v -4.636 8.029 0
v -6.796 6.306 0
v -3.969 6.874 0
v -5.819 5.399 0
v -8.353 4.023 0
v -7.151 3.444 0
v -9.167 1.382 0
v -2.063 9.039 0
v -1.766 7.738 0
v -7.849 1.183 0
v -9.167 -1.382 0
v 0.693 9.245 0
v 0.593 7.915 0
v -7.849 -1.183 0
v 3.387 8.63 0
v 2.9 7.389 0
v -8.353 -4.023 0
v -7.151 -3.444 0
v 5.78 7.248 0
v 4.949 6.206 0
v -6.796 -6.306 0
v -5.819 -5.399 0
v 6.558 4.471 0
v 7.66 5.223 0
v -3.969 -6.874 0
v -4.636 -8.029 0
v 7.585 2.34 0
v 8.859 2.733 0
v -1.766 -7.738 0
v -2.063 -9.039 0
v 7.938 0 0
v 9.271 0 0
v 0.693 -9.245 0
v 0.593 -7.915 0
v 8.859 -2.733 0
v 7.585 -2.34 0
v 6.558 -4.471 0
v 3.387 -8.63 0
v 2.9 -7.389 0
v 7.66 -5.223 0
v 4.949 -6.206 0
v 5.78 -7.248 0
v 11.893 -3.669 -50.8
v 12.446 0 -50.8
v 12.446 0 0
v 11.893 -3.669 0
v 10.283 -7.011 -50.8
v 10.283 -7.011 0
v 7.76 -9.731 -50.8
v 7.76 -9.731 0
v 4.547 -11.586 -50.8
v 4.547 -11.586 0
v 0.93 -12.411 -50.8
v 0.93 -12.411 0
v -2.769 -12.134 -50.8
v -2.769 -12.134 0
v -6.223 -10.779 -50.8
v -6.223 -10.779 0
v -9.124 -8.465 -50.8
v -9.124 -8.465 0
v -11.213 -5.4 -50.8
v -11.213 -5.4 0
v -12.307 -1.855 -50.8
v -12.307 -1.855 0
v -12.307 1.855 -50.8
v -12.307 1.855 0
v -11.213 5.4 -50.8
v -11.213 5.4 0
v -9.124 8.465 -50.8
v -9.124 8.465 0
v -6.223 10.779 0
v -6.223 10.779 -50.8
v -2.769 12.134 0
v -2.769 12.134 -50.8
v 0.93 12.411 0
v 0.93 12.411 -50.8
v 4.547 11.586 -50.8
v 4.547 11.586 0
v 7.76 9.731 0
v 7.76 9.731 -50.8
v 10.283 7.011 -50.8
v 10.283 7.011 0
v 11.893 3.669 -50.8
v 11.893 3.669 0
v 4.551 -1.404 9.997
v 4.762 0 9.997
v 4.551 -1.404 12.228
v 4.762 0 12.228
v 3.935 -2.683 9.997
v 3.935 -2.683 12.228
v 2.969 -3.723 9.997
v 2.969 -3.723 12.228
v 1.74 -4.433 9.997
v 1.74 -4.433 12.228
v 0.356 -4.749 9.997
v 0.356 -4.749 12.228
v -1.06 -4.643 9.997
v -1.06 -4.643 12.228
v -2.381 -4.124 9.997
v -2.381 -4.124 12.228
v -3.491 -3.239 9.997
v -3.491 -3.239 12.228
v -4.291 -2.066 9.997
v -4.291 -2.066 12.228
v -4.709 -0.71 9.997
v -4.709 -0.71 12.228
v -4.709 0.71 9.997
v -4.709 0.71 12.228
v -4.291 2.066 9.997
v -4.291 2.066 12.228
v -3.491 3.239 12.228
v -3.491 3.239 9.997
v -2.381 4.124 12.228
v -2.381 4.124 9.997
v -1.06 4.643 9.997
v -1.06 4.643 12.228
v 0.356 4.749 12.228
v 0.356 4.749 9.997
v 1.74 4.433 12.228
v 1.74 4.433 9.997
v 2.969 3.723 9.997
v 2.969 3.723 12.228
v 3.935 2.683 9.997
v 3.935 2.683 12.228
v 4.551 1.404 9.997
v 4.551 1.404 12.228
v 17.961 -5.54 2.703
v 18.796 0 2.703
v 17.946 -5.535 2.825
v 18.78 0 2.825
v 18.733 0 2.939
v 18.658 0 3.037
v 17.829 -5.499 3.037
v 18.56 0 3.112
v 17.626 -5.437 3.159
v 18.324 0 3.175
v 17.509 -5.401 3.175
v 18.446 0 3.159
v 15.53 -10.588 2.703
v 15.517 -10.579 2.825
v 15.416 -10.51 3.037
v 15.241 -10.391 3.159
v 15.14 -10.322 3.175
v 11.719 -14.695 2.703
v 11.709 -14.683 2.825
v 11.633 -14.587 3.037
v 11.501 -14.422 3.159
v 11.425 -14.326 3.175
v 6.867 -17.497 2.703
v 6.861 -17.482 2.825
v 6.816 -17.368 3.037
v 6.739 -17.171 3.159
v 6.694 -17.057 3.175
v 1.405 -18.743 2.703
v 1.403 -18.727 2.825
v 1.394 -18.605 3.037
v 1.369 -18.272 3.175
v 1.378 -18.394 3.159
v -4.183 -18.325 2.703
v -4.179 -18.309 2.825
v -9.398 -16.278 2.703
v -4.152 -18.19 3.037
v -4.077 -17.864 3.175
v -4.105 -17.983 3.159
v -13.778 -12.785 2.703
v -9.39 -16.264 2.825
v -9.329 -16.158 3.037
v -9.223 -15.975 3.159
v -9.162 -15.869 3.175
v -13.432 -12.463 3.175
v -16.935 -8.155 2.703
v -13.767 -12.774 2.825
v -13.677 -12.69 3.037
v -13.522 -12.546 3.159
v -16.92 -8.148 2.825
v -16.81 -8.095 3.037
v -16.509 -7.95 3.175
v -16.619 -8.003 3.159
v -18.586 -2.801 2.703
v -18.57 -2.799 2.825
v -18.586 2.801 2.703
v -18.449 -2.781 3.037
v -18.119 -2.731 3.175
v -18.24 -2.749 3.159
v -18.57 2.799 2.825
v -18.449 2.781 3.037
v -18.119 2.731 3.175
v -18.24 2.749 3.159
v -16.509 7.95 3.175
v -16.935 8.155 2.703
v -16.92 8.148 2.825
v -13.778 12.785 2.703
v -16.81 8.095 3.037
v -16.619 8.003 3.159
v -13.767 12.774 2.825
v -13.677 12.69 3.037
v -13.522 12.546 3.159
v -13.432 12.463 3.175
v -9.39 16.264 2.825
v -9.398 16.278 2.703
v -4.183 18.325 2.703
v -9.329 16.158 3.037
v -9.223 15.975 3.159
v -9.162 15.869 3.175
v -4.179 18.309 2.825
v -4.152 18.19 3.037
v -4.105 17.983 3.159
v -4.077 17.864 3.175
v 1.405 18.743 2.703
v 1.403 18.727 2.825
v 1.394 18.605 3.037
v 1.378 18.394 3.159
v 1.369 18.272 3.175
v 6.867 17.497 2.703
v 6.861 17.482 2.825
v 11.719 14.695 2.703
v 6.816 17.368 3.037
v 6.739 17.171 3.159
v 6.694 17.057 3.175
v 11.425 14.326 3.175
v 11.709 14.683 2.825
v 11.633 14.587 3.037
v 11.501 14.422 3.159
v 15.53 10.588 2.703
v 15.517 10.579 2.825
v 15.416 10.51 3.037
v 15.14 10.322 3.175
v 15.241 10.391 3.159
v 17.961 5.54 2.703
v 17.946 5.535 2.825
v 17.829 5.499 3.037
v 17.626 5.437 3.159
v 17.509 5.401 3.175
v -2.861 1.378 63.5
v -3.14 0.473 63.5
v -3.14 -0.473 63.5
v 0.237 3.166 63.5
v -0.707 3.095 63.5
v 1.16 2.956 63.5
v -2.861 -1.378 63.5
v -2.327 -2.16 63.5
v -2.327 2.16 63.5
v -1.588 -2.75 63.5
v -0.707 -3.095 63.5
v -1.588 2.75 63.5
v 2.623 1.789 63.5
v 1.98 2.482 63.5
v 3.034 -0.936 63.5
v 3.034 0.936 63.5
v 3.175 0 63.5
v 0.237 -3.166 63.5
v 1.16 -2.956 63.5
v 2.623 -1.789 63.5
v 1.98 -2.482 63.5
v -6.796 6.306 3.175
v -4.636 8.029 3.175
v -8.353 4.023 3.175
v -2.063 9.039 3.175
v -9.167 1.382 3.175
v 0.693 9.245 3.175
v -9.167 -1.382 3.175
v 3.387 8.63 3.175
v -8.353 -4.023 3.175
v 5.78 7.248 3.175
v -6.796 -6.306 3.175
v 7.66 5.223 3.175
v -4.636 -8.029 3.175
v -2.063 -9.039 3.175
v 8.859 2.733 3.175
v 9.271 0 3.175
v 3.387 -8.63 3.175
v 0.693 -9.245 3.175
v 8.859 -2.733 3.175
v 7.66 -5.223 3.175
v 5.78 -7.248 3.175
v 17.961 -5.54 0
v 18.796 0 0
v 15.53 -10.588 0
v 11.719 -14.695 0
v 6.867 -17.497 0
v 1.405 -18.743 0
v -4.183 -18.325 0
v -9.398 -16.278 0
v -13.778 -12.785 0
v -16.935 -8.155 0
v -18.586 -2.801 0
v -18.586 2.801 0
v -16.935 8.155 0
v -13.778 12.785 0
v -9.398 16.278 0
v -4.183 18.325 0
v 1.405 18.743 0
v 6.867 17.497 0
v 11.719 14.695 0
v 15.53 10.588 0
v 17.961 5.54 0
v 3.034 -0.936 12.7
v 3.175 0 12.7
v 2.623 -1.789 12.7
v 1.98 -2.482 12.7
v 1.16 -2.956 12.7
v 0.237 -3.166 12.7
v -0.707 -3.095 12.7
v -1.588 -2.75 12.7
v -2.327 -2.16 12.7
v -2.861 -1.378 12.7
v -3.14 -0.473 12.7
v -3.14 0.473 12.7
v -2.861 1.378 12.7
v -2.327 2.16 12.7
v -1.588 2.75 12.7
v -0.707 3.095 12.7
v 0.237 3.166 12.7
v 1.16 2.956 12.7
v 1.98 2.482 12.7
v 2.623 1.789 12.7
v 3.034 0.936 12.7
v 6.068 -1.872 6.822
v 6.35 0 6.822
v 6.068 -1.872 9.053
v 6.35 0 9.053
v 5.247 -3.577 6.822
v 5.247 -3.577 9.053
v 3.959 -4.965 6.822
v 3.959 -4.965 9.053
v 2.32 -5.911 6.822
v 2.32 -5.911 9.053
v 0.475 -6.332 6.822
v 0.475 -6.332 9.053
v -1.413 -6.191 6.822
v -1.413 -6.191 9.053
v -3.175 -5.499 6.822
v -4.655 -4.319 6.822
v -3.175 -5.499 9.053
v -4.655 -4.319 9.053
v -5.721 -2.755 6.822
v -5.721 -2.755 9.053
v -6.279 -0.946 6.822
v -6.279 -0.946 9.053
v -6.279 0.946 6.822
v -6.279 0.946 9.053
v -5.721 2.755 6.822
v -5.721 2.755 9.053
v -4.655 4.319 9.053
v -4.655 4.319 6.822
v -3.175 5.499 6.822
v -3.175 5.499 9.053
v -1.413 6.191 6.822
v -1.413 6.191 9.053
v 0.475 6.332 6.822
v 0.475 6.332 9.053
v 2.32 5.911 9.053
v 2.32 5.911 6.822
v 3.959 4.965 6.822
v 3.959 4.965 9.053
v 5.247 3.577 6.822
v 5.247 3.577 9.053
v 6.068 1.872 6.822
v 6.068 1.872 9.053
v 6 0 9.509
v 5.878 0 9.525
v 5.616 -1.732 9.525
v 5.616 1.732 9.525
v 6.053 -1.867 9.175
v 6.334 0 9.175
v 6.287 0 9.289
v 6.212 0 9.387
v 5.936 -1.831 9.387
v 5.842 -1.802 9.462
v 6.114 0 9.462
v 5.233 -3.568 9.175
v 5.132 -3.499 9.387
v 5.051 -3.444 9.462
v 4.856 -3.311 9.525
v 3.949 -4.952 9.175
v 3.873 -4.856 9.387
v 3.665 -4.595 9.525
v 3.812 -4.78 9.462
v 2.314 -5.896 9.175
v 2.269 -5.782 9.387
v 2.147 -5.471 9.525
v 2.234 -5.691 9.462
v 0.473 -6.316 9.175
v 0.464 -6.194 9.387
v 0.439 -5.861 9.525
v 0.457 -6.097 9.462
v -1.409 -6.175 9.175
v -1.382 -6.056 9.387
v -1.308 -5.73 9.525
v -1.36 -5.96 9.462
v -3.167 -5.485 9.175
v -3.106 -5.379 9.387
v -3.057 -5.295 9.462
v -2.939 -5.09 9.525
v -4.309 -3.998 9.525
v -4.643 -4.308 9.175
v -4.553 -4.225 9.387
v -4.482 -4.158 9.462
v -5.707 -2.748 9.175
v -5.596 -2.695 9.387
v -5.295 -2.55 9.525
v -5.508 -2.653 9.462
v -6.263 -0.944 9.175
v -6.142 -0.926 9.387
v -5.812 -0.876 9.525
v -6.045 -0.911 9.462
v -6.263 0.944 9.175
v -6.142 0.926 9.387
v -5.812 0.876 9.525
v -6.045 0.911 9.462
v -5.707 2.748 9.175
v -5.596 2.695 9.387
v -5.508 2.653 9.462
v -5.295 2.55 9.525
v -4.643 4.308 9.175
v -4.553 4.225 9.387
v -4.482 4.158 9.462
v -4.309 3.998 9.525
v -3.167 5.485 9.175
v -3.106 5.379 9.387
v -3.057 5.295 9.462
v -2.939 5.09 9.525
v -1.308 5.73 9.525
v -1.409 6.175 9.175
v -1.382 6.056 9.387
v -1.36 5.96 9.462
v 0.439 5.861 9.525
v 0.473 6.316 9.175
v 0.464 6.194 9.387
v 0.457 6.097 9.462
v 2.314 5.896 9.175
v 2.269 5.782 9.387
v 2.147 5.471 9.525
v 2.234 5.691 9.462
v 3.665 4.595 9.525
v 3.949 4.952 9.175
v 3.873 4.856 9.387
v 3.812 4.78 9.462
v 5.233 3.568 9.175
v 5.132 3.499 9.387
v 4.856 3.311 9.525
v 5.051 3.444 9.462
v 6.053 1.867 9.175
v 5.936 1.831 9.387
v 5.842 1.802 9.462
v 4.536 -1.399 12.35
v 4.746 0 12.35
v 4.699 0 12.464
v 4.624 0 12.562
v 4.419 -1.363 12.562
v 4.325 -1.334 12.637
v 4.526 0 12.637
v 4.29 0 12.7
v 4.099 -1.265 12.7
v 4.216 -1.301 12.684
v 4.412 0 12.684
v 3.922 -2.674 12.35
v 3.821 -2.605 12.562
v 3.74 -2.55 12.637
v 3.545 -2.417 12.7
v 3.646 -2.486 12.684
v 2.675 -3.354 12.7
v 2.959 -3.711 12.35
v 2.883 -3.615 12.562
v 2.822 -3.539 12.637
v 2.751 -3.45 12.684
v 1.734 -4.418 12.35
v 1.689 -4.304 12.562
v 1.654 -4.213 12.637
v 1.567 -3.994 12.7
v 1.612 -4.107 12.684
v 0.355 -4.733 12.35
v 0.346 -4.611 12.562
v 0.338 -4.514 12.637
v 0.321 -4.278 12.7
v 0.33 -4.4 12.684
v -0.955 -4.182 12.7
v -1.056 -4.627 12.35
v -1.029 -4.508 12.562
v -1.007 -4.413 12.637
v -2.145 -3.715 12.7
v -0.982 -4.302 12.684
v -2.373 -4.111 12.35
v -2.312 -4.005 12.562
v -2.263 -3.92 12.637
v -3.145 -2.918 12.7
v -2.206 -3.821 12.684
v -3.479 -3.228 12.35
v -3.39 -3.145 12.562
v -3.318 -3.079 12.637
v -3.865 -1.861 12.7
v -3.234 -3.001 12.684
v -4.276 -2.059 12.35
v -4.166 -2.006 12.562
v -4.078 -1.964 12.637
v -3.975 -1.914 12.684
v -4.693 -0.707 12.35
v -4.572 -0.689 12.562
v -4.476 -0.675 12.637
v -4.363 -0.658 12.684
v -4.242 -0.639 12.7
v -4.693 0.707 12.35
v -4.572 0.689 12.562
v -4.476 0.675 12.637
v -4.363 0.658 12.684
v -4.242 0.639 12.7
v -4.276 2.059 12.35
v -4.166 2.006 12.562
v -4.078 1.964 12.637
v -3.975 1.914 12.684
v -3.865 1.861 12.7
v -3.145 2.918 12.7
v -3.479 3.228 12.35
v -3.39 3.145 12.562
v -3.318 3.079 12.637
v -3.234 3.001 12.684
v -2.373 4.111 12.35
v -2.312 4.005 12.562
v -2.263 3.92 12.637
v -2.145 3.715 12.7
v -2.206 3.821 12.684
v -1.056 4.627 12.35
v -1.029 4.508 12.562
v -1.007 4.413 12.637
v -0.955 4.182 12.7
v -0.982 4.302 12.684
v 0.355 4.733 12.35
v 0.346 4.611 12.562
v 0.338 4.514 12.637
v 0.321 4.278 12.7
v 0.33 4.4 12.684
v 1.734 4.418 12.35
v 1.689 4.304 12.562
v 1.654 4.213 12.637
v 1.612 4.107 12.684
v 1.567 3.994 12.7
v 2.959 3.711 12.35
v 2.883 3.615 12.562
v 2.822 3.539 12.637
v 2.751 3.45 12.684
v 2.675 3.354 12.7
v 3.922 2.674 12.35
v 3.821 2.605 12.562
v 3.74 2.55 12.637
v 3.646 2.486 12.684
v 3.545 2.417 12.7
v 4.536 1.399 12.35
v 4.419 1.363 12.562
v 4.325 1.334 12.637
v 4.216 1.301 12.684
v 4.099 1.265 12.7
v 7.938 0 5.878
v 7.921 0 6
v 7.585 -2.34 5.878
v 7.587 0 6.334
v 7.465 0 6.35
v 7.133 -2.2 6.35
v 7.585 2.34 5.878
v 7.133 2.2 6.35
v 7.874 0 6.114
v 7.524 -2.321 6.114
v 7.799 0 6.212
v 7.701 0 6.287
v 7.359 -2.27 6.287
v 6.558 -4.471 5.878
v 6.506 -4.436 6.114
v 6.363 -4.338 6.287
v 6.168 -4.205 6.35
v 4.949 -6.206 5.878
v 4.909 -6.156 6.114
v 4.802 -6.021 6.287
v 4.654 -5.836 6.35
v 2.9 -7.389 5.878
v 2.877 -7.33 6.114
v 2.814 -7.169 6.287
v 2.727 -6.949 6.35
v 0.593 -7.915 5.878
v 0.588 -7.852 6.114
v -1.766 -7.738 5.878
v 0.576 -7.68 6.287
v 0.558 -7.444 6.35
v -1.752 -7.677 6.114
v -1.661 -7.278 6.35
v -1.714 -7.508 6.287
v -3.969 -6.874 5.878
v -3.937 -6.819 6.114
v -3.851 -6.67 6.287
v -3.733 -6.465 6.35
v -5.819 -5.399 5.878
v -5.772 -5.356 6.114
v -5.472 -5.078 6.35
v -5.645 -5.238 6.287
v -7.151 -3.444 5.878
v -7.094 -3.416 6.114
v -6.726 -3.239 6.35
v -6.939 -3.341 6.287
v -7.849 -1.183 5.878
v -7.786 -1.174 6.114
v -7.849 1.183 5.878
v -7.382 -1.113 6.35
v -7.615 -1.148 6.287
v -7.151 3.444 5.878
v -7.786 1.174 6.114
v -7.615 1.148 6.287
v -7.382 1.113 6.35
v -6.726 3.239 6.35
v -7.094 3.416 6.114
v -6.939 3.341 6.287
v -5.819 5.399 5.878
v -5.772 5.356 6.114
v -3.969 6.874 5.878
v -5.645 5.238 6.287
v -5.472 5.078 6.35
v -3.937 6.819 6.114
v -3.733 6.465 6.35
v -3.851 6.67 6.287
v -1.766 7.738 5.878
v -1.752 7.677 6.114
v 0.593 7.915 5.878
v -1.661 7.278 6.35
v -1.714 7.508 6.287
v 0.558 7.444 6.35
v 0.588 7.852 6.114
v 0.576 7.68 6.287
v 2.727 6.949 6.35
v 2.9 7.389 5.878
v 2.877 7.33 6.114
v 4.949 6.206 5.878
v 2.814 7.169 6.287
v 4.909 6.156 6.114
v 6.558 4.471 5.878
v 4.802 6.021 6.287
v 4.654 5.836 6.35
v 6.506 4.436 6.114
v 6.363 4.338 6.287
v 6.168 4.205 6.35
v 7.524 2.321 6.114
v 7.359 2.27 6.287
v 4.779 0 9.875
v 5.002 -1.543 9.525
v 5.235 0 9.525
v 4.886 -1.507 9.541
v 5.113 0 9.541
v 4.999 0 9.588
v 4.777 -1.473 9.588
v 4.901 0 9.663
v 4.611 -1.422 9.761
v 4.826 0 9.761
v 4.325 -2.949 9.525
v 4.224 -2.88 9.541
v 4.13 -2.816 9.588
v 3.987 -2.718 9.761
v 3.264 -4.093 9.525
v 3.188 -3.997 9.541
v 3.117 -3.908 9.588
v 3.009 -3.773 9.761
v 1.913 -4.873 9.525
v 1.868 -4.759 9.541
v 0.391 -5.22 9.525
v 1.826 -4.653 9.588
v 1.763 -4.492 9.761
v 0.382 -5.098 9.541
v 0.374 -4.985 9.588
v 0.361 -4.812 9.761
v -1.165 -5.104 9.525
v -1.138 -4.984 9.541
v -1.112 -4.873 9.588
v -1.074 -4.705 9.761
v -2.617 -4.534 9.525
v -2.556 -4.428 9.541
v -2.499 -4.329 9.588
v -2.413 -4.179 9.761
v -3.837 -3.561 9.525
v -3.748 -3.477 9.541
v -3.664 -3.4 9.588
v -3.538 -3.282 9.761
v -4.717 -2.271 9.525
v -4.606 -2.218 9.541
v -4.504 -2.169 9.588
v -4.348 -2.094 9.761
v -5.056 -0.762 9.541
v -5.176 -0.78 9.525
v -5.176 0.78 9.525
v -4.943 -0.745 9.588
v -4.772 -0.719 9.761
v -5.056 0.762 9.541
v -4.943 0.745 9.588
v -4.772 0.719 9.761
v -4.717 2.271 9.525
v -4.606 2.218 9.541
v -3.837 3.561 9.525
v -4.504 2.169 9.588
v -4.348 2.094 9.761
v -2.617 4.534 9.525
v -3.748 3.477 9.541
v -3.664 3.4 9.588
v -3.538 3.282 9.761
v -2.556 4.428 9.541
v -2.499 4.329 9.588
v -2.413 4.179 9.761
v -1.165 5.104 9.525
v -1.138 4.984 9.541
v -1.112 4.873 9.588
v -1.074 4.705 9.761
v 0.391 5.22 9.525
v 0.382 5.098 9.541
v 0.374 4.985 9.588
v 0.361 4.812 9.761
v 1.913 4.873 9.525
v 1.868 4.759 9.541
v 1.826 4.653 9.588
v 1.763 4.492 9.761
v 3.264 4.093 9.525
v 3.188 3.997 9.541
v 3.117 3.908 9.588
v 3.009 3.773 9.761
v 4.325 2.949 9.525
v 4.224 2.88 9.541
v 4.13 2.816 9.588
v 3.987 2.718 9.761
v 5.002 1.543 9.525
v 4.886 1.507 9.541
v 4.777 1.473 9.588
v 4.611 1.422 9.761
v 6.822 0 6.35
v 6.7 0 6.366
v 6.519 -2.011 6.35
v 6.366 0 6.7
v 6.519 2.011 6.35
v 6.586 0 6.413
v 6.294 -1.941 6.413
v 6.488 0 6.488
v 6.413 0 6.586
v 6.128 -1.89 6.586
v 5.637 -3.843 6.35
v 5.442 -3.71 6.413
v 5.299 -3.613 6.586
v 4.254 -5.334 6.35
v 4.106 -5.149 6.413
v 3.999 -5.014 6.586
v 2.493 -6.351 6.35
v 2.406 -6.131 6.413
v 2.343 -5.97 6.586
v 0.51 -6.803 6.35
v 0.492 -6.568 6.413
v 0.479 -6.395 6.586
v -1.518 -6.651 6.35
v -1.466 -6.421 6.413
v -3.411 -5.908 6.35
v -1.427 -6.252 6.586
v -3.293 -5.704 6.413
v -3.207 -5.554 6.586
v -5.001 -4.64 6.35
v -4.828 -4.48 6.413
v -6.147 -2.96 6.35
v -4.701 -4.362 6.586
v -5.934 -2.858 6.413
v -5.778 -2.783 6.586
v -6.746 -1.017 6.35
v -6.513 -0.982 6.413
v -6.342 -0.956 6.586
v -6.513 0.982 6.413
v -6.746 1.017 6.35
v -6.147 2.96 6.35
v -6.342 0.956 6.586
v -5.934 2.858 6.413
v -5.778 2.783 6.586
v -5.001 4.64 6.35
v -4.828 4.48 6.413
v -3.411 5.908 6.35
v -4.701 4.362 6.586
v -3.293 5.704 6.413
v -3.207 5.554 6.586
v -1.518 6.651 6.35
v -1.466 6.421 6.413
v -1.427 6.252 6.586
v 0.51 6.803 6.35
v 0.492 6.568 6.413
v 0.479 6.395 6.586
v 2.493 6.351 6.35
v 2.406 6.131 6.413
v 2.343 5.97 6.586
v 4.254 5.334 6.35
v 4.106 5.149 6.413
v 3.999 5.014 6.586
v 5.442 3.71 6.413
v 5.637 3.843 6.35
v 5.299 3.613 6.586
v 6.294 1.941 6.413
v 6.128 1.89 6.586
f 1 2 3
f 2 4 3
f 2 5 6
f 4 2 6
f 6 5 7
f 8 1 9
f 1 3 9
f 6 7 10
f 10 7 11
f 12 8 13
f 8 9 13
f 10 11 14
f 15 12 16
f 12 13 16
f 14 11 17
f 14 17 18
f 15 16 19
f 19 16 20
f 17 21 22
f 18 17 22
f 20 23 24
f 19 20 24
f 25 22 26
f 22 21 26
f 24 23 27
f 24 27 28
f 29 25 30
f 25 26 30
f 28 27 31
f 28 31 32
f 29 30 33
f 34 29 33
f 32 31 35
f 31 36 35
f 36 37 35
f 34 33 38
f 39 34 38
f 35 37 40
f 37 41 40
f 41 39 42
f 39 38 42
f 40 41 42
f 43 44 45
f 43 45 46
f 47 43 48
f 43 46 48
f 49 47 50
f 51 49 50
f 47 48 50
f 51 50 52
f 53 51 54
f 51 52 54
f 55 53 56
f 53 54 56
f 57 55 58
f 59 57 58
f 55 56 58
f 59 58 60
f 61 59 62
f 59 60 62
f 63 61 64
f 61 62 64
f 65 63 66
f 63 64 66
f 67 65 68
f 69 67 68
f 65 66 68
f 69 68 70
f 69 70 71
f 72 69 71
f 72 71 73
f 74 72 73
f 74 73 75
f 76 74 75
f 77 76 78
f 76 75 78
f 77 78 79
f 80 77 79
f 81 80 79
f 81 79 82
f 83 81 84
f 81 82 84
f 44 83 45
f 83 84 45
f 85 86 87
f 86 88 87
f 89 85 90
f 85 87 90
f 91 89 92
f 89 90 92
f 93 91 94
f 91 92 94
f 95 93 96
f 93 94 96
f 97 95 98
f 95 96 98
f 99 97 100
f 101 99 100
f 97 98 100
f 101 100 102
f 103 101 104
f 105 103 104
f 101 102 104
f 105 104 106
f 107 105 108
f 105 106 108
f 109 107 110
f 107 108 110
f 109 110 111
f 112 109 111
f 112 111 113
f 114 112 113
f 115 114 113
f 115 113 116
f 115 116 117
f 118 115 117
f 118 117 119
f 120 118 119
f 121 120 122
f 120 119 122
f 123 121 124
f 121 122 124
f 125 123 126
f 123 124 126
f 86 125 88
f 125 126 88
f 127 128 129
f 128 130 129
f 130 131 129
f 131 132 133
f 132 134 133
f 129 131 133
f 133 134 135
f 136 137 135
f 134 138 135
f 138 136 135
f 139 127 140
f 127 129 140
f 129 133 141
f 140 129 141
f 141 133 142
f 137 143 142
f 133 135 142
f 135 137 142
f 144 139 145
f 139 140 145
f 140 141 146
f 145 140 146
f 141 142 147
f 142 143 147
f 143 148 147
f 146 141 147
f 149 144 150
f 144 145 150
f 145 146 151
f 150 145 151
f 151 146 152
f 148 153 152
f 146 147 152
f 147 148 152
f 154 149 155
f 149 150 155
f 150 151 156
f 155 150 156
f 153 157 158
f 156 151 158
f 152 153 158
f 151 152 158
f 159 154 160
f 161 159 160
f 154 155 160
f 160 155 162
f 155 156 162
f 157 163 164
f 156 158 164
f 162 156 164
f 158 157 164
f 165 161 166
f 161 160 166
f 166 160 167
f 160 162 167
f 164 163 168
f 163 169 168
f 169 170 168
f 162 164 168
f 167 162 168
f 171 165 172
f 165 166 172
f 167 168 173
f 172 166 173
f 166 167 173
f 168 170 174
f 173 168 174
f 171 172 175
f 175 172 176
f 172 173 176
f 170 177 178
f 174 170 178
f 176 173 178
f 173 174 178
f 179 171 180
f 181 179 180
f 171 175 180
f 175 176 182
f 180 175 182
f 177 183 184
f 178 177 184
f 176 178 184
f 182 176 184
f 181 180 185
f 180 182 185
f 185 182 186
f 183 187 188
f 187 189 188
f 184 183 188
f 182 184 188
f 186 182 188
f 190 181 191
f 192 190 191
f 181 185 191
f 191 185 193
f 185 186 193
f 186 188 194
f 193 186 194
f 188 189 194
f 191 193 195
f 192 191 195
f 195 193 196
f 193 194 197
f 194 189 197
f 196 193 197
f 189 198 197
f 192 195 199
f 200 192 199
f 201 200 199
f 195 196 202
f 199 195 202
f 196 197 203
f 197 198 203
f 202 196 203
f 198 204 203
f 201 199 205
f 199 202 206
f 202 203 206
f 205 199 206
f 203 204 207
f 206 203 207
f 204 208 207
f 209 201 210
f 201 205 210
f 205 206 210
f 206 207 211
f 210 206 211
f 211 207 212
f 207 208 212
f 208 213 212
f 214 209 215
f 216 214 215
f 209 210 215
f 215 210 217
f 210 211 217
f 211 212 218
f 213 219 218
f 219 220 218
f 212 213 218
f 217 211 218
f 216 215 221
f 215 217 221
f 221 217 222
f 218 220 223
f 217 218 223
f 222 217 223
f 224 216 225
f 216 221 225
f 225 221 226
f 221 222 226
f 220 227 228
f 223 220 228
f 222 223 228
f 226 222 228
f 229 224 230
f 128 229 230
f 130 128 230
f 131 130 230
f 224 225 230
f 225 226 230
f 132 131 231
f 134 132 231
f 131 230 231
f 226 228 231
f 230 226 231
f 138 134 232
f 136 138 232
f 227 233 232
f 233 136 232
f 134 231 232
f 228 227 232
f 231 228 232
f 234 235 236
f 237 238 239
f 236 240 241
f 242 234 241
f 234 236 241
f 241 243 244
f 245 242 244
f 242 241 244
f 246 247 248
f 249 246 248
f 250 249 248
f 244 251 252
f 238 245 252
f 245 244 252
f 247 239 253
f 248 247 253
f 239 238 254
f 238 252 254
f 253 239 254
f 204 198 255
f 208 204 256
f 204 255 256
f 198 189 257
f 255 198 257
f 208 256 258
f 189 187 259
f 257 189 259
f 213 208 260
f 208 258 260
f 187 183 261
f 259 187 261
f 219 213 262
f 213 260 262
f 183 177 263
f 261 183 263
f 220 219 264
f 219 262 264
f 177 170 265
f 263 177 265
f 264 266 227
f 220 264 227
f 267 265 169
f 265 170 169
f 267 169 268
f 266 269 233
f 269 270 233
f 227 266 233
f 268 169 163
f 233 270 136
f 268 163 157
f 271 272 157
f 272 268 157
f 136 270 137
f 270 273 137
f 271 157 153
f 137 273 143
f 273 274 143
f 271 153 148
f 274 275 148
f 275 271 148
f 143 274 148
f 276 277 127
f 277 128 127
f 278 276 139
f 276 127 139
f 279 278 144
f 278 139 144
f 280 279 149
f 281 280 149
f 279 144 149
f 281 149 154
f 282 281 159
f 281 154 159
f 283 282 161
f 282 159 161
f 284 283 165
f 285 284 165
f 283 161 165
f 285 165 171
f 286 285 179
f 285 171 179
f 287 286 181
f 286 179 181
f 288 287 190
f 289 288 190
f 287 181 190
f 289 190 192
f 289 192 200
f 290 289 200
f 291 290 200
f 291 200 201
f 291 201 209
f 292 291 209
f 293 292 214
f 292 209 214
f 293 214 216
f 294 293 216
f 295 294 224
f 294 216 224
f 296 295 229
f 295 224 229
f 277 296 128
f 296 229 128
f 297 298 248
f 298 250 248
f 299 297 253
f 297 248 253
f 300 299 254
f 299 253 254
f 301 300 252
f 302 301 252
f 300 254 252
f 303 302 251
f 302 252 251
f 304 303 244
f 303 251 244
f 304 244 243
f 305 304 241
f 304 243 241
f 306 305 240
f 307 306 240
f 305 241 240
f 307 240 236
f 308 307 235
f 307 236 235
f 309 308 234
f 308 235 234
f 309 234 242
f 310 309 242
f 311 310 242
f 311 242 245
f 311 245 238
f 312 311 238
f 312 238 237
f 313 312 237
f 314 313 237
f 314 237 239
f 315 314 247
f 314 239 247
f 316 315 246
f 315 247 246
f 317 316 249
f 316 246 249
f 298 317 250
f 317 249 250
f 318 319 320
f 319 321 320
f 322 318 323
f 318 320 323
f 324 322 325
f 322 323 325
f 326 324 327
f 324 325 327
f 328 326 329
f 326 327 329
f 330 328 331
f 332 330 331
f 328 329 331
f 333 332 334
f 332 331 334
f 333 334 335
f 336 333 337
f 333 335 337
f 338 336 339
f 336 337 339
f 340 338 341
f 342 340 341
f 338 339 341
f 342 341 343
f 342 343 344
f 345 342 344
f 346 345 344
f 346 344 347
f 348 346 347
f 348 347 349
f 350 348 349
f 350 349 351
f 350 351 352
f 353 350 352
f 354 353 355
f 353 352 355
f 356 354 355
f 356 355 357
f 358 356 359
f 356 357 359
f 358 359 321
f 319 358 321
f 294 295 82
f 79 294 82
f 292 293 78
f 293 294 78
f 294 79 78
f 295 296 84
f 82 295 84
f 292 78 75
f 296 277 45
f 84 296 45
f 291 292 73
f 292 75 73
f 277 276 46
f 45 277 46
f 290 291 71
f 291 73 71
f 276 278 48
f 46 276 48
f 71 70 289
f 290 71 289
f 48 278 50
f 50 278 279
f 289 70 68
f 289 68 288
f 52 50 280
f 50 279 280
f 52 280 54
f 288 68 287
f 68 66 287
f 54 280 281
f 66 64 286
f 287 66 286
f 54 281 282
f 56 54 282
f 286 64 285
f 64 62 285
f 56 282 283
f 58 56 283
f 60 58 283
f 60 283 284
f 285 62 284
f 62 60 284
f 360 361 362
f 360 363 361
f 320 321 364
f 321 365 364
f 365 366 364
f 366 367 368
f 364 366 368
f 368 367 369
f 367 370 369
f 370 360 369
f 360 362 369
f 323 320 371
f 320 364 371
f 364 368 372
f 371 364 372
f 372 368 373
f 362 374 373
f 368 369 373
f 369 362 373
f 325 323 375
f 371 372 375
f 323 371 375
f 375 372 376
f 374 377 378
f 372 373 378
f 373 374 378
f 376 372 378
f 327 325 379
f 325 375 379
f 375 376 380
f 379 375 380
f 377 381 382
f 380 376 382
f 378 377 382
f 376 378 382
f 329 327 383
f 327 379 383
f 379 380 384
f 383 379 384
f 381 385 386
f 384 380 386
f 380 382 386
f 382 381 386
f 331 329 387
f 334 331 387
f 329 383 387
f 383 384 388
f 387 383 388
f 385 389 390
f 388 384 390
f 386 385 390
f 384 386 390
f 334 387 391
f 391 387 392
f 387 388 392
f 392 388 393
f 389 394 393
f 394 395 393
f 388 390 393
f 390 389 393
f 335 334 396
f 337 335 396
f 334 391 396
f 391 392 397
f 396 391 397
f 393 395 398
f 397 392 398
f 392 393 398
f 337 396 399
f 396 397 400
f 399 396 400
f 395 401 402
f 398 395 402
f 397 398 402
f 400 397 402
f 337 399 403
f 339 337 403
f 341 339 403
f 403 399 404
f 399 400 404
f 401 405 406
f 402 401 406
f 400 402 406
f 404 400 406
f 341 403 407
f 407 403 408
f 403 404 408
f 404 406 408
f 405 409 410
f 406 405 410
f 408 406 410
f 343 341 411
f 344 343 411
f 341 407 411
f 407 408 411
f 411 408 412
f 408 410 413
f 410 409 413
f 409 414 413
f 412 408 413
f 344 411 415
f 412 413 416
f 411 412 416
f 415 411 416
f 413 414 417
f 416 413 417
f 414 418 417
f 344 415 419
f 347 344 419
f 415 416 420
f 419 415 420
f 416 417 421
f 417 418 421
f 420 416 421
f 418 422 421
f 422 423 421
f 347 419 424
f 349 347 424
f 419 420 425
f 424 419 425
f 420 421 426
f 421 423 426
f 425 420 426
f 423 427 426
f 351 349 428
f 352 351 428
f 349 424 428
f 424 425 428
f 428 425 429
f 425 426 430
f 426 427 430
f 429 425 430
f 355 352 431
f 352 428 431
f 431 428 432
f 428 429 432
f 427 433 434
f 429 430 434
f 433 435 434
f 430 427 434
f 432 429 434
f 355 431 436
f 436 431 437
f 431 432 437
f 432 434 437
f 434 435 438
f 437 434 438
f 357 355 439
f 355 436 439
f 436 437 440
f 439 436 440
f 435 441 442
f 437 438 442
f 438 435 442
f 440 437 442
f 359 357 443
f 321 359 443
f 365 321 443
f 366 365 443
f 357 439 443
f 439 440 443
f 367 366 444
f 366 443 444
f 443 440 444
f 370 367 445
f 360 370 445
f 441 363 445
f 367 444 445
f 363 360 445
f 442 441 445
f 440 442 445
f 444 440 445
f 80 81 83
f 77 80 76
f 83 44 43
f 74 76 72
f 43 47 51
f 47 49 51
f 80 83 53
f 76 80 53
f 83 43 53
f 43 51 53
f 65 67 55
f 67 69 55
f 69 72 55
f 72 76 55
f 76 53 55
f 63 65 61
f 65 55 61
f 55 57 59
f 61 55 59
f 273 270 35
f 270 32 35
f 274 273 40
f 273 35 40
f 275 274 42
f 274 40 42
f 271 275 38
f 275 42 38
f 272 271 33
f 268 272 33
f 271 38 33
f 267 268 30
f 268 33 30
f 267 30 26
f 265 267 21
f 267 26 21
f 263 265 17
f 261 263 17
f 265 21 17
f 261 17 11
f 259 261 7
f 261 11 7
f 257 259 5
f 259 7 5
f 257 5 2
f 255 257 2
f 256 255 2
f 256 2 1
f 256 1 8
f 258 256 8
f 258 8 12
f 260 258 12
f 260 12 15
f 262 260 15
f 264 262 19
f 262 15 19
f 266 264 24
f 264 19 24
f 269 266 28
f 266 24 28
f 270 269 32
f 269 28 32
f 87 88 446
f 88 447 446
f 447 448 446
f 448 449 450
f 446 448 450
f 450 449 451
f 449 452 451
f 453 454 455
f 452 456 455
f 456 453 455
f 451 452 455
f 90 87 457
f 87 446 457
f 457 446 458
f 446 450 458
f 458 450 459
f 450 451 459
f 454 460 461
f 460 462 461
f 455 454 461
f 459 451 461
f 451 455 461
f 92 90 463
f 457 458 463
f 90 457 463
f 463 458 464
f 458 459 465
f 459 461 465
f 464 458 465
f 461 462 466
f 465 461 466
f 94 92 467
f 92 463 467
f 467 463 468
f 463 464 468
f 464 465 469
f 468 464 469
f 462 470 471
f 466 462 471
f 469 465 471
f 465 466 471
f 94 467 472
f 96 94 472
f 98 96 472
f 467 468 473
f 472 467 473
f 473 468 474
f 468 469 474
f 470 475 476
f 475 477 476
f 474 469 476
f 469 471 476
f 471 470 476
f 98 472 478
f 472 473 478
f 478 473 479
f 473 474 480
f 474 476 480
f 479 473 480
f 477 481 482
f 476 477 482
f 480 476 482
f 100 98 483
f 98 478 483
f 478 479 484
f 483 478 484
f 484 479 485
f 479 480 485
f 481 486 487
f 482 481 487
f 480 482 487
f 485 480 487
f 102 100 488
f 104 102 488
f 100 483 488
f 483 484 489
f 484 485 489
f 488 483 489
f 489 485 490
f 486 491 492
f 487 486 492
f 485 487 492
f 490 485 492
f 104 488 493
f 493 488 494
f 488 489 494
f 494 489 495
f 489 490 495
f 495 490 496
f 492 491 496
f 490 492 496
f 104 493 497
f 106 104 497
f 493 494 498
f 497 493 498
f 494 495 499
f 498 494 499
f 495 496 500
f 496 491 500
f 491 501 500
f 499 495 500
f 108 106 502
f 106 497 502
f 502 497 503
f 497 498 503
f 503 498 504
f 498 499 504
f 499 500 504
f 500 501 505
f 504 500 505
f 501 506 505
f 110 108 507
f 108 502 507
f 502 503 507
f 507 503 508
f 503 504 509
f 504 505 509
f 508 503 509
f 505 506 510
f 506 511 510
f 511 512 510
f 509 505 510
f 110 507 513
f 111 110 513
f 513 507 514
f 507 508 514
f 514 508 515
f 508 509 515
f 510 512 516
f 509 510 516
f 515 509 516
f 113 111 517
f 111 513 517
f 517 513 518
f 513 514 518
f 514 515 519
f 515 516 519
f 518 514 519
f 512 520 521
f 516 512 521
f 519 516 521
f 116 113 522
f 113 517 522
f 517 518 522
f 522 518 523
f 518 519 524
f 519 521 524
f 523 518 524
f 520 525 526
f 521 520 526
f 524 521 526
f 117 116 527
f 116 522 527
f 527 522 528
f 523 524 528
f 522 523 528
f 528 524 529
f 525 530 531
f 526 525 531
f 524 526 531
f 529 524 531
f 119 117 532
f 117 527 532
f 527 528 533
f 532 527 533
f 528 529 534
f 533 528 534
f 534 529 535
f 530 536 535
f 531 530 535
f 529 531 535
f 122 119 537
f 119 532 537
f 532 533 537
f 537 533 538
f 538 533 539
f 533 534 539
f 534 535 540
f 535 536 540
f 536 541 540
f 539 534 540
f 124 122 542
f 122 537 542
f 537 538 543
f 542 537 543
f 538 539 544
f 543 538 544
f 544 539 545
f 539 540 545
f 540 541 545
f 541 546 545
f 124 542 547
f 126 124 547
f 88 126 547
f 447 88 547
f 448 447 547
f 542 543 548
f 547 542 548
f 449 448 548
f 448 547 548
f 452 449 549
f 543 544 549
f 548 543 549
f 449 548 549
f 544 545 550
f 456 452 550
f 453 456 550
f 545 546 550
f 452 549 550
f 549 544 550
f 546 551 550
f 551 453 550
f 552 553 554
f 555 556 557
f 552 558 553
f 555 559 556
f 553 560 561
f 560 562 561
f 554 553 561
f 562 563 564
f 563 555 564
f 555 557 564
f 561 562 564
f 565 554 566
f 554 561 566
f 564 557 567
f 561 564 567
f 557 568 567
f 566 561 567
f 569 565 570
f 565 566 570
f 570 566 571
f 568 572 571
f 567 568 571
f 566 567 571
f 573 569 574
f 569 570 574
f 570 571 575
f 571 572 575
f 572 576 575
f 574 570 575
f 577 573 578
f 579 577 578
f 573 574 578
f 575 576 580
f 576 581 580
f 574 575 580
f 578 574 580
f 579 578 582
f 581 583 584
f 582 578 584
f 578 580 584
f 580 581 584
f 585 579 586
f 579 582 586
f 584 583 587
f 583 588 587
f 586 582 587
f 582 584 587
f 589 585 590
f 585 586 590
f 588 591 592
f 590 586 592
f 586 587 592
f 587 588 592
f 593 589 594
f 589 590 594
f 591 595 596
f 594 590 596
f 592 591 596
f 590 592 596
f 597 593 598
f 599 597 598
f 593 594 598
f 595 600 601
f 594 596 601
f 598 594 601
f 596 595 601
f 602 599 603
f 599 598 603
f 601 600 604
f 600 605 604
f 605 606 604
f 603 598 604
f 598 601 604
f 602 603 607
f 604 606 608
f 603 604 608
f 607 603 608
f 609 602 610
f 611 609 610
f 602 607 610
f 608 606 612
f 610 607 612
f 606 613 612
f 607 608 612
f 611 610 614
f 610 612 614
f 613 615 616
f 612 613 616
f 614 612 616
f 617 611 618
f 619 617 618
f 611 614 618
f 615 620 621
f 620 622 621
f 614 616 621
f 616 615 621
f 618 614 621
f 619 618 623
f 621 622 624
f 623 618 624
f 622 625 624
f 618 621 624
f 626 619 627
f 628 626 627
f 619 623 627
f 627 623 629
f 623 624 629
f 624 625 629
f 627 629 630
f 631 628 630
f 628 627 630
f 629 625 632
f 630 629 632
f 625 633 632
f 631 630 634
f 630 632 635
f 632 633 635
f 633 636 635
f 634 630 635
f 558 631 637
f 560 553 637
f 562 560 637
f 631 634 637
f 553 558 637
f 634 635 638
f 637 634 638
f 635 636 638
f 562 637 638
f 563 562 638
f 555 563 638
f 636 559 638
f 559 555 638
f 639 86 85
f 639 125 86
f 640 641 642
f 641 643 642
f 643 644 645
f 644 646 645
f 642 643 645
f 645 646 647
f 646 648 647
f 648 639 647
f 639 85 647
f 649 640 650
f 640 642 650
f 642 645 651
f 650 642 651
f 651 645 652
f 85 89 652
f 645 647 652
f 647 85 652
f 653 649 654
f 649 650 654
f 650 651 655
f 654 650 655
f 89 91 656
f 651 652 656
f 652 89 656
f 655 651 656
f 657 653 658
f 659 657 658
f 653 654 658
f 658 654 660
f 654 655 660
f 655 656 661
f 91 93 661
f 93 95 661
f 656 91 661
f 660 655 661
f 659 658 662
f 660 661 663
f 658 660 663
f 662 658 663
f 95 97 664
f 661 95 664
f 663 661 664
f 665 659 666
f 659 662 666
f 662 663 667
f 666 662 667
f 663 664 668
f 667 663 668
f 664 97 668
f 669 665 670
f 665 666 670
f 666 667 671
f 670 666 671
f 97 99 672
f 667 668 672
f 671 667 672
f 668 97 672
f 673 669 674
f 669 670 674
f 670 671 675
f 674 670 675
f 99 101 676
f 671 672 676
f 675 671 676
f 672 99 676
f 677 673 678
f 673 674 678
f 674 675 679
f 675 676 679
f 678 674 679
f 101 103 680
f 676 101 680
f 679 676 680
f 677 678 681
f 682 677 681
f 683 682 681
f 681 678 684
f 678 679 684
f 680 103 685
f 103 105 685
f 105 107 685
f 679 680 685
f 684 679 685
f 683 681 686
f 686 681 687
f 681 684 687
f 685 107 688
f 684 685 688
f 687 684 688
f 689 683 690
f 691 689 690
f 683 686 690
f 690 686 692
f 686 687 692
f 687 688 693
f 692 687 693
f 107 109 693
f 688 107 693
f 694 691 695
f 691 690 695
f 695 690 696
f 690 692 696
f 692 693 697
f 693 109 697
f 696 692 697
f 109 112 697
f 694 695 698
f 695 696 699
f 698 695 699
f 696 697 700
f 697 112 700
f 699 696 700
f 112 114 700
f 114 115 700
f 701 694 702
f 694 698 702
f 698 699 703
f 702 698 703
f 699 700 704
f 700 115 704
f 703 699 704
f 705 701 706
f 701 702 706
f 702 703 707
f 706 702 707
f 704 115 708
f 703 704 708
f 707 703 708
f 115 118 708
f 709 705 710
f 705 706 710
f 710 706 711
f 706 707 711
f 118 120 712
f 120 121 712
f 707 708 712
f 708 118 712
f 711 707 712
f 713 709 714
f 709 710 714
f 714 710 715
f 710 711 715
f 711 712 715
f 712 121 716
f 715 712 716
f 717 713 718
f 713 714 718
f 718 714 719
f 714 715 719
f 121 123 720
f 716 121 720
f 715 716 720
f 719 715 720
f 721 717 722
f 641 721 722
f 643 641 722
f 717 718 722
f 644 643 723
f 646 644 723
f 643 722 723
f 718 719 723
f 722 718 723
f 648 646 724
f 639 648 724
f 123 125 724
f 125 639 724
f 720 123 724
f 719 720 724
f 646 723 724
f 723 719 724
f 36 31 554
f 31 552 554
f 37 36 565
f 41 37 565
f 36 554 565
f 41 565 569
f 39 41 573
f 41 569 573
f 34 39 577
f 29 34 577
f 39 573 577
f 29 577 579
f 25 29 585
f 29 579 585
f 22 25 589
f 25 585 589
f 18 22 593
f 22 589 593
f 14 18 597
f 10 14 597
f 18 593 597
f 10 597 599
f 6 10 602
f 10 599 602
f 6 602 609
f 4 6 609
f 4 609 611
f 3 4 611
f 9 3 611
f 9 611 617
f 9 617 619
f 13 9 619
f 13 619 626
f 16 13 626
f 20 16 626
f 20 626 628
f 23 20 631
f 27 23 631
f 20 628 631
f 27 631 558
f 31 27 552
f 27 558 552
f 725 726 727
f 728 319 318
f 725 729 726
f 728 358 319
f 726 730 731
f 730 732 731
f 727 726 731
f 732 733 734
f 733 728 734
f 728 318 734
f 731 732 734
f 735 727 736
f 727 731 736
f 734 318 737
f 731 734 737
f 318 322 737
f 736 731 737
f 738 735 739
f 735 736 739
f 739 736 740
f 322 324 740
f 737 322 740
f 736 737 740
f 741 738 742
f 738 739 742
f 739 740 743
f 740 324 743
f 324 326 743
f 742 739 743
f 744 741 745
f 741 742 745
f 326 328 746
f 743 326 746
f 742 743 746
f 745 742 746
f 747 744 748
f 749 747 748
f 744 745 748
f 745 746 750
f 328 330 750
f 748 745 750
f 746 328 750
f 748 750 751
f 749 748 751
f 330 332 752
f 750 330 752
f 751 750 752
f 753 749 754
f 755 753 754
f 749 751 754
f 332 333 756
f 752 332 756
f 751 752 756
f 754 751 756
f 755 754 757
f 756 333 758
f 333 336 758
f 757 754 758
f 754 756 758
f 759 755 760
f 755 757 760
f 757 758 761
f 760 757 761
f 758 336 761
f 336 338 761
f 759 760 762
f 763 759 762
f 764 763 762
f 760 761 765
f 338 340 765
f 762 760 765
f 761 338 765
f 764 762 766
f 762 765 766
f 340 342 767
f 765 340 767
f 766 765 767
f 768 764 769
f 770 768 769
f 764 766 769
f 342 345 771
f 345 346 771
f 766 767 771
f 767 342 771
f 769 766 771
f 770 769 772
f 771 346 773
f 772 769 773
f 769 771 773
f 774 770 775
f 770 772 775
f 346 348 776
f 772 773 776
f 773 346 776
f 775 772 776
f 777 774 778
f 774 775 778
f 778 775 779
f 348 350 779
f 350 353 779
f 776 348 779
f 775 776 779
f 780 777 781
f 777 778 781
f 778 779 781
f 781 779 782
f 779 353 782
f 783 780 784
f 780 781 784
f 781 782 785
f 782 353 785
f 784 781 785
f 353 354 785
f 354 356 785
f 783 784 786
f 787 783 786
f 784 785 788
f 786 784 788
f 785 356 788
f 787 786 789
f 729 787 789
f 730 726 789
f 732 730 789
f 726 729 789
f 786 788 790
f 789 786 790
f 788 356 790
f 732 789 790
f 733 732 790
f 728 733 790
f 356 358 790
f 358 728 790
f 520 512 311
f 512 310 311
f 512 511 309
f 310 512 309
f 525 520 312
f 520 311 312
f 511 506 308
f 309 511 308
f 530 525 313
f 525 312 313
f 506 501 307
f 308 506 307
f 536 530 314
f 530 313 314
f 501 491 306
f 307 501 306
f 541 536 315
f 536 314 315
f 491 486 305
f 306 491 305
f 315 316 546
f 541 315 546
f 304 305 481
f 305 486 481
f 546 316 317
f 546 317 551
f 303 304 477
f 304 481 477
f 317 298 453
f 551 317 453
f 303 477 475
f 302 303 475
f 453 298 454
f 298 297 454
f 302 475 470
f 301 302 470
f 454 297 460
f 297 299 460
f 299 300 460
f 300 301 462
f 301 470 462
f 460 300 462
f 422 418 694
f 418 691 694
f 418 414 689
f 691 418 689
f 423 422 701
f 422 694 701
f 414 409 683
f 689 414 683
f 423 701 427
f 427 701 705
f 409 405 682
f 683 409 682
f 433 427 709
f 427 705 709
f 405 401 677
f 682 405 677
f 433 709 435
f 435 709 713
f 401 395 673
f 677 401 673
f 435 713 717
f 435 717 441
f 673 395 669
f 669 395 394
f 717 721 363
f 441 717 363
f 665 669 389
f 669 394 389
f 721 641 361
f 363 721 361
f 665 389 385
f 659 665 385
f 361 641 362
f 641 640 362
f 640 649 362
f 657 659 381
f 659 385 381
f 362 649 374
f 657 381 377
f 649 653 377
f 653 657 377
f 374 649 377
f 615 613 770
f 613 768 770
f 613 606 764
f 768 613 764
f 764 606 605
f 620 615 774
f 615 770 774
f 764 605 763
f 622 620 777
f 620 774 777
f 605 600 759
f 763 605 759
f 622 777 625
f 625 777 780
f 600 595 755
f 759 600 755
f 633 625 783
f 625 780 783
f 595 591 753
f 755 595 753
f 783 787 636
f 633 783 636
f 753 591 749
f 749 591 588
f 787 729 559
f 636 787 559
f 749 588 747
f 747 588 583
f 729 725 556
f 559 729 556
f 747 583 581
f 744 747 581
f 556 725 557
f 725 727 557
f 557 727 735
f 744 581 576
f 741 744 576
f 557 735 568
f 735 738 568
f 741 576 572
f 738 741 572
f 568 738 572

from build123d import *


with BuildPart() as f1:
    # F0 (on Front) → F1 (revolve)
    with BuildSketch(Plane.XZ):
        with BuildLine():
            Line((7.9375, 0), (0, 0))
            Line((0, 0), (0, -50.8))
            Line((0, -50.8), (12.446, -50.8))
            Line((12.446, -50.8), (12.446, 0))
            Line((12.446, 0), (18.796, 0))
            Line((18.796, 0), (18.796, 2.70256))
            ThreePointArc((18.796, 2.70256), (18.657626, 3.036626), (18.32356, 3.175))
            Line((18.32356, 3.175), (9.271, 3.175))
            Line((9.271, 3.175), (9.271, 0))
            Line((9.271, 0), (7.9375, 0))
        make_face()
        with BuildLine():
            Line((0, 63.5), (0, 0))
            Line((0, 0), (7.9375, 0))
            Line((7.9375, 0), (7.9375, 5.87756))
            ThreePointArc((7.9375, 5.87756), (7.799126, 6.211626), (7.46506, 6.35))
            Line((7.46506, 6.35), (6.82244, 6.35))
            ThreePointArc((6.82244, 6.35), (6.488374, 6.488374), (6.35, 6.82244))
            Line((6.35, 6.82244), (6.35, 9.05256))
            ThreePointArc((6.35, 9.05256), (6.211626, 9.386626), (5.87756, 9.525))
            Line((5.87756, 9.525), (5.23494, 9.525))
            ThreePointArc((5.23494, 9.525), (4.900874, 9.663374), (4.7625, 9.99744))
            Line((4.7625, 9.99744), (4.7625, 12.22756))
            ThreePointArc((4.7625, 12.22756), (4.624126, 12.561626), (4.29006, 12.7))
            Line((4.29006, 12.7), (3.175, 12.7))
            Line((3.175, 12.7), (3.175, 63.5))
            Line((3.175, 63.5), (0, 63.5))
        make_face()
    revolve(axis=Axis((0, 0, 6.323627), (0, 0, -1)))


solid = f1.part
